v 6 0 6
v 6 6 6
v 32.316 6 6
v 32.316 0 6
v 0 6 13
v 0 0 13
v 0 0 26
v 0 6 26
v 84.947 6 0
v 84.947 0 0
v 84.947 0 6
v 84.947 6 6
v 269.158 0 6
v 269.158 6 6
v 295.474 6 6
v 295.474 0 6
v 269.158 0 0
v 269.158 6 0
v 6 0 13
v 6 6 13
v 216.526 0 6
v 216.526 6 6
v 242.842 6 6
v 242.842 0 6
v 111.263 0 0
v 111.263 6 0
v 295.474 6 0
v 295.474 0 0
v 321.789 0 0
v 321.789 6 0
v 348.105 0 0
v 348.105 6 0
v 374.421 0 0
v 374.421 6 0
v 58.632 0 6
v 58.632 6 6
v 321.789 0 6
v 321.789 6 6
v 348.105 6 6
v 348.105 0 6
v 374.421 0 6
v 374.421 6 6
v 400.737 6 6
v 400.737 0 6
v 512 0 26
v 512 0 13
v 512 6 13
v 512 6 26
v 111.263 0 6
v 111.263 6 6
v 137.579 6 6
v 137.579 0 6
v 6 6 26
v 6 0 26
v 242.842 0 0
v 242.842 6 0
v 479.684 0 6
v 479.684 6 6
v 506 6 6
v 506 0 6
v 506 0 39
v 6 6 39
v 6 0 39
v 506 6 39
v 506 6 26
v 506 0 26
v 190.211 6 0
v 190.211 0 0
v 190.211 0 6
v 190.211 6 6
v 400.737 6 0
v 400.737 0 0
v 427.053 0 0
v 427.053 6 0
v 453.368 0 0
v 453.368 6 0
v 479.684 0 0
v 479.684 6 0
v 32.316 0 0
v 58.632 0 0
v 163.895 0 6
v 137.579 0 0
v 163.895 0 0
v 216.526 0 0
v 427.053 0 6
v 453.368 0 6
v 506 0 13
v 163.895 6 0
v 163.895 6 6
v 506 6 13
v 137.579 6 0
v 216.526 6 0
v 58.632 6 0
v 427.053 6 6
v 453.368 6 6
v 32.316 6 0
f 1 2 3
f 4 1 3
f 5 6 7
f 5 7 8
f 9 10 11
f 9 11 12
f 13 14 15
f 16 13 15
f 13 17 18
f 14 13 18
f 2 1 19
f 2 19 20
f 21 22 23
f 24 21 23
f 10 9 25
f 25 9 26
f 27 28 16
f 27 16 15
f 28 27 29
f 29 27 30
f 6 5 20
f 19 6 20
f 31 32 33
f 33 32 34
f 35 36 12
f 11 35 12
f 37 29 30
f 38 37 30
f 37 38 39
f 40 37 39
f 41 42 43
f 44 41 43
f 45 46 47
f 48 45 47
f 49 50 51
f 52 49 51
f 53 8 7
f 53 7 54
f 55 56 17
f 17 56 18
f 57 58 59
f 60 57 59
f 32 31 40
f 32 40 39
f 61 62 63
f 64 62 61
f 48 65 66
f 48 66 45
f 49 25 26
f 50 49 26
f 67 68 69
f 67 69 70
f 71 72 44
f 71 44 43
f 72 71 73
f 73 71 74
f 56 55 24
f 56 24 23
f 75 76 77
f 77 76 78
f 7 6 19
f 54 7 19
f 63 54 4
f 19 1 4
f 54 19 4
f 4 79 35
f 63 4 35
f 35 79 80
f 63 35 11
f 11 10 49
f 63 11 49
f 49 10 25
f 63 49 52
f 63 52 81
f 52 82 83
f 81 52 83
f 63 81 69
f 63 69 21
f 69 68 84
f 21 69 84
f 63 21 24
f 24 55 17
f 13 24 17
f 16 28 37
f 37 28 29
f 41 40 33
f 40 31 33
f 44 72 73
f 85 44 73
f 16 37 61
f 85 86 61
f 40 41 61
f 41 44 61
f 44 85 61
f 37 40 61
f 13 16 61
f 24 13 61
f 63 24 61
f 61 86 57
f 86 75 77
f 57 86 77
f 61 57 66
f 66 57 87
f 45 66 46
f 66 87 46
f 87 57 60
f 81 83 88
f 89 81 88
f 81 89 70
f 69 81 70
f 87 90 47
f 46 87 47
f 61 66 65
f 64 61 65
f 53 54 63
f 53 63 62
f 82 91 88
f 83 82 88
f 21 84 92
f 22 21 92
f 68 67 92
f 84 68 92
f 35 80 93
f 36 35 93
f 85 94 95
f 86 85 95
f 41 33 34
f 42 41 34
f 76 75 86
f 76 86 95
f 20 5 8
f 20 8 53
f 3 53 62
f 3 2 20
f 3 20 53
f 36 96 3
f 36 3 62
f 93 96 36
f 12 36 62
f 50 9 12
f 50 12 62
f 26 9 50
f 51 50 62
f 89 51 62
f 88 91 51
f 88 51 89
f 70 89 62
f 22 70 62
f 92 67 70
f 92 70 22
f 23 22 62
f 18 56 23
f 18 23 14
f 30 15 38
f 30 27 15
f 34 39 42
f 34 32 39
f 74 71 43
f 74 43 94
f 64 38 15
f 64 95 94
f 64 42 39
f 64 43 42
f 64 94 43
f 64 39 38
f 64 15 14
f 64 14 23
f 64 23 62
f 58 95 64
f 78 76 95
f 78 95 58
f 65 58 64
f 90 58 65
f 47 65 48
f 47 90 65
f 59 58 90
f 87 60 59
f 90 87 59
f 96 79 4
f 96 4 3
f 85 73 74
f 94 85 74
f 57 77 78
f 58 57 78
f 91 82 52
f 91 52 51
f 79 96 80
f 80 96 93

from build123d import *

# Parameters (mm, degrees)
BOX002_W         = 6
BOX002_H         = 10
BOX002_DEPTH     = 13
ARRAY003_X_COUNT = 2
ARRAY003_X_PITCH = 506
ARRAY003_Z_COUNT = 2
ARRAY003_Z_PITCH = 26
BOX001_W         = 26.3157894737
BOX001_H         = 10
BOX001_DEPTH     = 6
ARRAY001_X_COUNT = 10
ARRAY001_X_PITCH = 52.6315789474
BOX_W            = 512
BOX_H            = 6
BOX_DEPTH        = 39


with BuildPart() as vertical_array:
    # Box002 → Box002 (new body)
    with BuildSketch(Plane.XY):
        with Locations((3, 5)):
            Rectangle(BOX002_W, BOX002_H)
    extrude(amount=BOX002_DEPTH)

    # Array003 X: Vertical_Array ×2


with BuildPart() as vertical_array_1:
    add(vertical_array.part)
    with Locations(*[(i * ARRAY003_X_PITCH, 0, 0) for i in range(1, ARRAY003_X_COUNT)]):
        add(vertical_array.part)

    # Array003 Z: Vertical_Array ×2


with BuildPart() as vertical_array_2:
    add(vertical_array_1.part)
    with Locations(*[(0, 0, i * ARRAY003_Z_PITCH) for i in range(1, ARRAY003_Z_COUNT)]):
        add(vertical_array_1.part)


with BuildPart() as horizontal_array:
    # Box001 → Box001 (new body)
    with BuildSketch(Plane.XY):
        with Locations((13.1578947368, 5)):
            Rectangle(BOX001_W, BOX001_H)
    extrude(amount=BOX001_DEPTH)

    # Array001 X: Horizontal_Array ×10


with BuildPart() as horizontal_array_1:
    add(horizontal_array.part)
    with Locations(*[(i * ARRAY001_X_PITCH, 0, 0) for i in range(1, ARRAY001_X_COUNT)]):
        add(horizontal_array.part)


with BuildPart() as horizontal_array_2:
    # Array001 placement: moved
    add(horizontal_array_1.part.moved(Location((6, 0, 0))))


with BuildPart() as cut001:
    # Box → Box (new body)
    with BuildSketch(Plane.XY):
        with Locations((256, 3)):
            Rectangle(BOX_W, BOX_H)
    extrude(amount=BOX_DEPTH)

    # Cut: cut Horizontal_Array
    add(horizontal_array_2.part, mode=Mode.SUBTRACT)

    # Cut001: cut Vertical_Array
    add(vertical_array_2.part, mode=Mode.SUBTRACT)


solid = cut001.part
